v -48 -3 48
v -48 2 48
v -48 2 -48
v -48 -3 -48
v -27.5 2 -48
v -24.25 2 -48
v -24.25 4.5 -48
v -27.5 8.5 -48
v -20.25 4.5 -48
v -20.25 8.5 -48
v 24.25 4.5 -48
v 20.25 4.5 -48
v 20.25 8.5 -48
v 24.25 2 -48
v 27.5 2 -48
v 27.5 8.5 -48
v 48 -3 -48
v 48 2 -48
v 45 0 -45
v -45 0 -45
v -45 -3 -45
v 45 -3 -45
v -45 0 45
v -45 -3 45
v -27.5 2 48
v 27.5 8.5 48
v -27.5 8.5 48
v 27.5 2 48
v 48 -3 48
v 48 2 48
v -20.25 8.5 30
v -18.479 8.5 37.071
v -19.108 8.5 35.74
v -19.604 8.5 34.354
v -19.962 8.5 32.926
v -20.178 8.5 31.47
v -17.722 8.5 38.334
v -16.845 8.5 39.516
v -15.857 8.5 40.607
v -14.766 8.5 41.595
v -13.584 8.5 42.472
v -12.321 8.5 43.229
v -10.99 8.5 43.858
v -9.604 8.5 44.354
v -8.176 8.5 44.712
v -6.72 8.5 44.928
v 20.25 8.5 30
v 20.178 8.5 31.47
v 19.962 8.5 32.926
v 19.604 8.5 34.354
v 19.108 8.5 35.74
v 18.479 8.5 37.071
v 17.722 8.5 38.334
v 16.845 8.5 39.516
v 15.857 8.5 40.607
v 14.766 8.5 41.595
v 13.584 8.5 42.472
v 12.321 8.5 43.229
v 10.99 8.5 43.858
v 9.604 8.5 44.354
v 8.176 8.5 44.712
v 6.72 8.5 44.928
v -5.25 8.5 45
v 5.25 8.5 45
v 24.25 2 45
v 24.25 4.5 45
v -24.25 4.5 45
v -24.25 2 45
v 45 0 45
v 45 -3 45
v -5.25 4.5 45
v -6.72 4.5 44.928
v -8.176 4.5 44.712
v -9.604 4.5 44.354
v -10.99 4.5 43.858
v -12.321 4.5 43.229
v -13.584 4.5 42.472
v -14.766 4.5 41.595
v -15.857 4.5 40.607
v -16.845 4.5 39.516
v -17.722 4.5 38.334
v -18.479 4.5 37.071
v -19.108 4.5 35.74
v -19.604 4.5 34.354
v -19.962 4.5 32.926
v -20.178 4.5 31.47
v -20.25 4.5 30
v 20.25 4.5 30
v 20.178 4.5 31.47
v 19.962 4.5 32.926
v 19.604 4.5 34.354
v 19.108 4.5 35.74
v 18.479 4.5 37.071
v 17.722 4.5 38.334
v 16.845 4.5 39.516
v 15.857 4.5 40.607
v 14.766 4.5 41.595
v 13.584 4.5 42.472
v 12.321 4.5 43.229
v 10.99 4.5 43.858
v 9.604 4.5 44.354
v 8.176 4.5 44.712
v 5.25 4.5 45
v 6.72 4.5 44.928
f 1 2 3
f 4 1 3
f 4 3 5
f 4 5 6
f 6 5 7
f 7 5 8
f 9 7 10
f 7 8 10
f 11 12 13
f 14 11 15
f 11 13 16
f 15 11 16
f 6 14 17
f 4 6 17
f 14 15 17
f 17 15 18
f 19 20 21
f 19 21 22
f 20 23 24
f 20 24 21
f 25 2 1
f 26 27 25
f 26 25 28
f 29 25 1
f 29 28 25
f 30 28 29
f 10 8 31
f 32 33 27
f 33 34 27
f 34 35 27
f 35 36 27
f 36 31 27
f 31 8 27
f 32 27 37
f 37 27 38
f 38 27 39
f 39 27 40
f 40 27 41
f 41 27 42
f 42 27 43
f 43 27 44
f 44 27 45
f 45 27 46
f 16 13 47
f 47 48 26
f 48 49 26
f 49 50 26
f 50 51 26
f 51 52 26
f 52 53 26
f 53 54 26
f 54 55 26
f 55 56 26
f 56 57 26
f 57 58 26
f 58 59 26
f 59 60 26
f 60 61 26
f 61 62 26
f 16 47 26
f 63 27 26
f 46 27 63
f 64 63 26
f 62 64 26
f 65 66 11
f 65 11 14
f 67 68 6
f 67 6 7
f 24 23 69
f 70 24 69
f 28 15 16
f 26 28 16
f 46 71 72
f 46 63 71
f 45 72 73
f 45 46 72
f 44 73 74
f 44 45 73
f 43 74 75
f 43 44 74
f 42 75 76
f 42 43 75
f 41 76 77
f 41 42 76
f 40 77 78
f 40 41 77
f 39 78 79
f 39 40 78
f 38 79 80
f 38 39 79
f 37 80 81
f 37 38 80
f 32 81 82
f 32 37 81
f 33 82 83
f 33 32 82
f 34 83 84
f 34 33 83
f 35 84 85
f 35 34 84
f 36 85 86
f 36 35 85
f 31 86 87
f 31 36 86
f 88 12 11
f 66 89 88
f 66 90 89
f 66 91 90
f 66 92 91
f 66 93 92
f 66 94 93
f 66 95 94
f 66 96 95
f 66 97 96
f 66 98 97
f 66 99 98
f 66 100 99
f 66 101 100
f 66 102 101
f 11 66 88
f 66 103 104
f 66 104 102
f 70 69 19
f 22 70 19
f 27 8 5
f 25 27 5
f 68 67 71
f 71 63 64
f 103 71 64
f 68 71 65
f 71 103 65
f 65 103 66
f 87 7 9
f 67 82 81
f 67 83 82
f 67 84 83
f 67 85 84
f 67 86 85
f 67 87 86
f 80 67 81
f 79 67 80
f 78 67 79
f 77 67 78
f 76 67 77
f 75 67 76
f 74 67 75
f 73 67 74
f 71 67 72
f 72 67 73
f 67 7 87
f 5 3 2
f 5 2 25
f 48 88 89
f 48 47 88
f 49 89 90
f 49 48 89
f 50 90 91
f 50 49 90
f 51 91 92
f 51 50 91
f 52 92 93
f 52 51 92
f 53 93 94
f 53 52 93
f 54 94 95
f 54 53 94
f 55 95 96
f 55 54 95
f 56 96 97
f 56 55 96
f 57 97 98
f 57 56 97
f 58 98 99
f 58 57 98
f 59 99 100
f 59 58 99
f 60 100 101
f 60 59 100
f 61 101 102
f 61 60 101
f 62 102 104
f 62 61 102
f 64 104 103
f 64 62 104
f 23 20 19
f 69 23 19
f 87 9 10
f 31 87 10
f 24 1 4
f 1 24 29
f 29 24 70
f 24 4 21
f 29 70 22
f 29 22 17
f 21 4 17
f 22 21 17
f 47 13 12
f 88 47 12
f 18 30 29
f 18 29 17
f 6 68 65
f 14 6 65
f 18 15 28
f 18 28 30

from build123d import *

# Parameters (mm, degrees)
SKETCH1_W           = 96
SKETCH1_H           = 96
SKETCH1_W_2         = 90
SKETCH1_H_2         = 90
BOSS_EXTRUDE1_DEPTH = 2
SKETCH1_3_W         = 96
SKETCH1_3_H         = 96
SKETCH1_3_W_2       = 90
SKETCH1_3_H_2       = 90
BOSS_EXTRUDE2_DEPTH = 3
BOSS_EXTRUDE3_DEPTH = 96
SKETCH3_3_W         = 40.5
SKETCH3_3_H         = 4
BOSS_EXTRUDE4_DEPTH = 3
FILLET1_R           = 15


with BuildPart() as part:
    # Sketch1 → Boss-Extrude1 (new body)
    # profile 1 of 2: a face of its own
    with BuildSketch(Plane(origin=(0, 0, 0), x_dir=(1, 0, 0), z_dir=(0, 1, 0))):
        Rectangle(SKETCH1_W, SKETCH1_H)
        Rectangle(SKETCH1_W_2, SKETCH1_H_2, mode=Mode.SUBTRACT)
    # profile 2 of 2: a face of its own
    with BuildSketch(Plane(origin=(0, 0, 0), x_dir=(1, 0, 0), z_dir=(0, 1, 0))):
        Rectangle(SKETCH1_W_2, SKETCH1_H_2)
    extrude(amount=BOSS_EXTRUDE1_DEPTH)

    # Sketch1<3> → Boss-Extrude2 (add)
    with BuildSketch(Plane(origin=(0, 0, 0), x_dir=(1, 0, 0), z_dir=(0, 1, 0))):
        Rectangle(SKETCH1_3_W, SKETCH1_3_H)
        Rectangle(SKETCH1_3_W_2, SKETCH1_3_H_2, mode=Mode.SUBTRACT)
    extrude(amount=-BOSS_EXTRUDE2_DEPTH)

    # Sketch3 → Boss-Extrude3 (add)
    with BuildSketch(Plane.XY.offset(48)):
        Polygon((-27.5, 8.5), (-27.5, 2), (-24.25, 2), (-24.25, 4.5), (-20.25, 4.5), (-20.25, 8.5), align=None)
        Polygon((24.25, 4.5), (24.25, 2), (27.5, 2), (27.5, 8.5), (20.25, 8.5), (20.25, 4.5), align=None)
    extrude(amount=-BOSS_EXTRUDE3_DEPTH)

    # Sketch3<3> → Boss-Extrude4 (add)
    with BuildSketch(Plane.XY.offset(48)):
        Polygon((-24.25, 4.5), (-24.25, 2), (24.25, 2), (24.25, 4.5), (20.25, 4.5), (-20.25, 4.5), align=None)
        with Locations((0, 6.5)):
            Rectangle(SKETCH3_3_W, SKETCH3_3_H)
    extrude(amount=-BOSS_EXTRUDE4_DEPTH)

    # Fillet1
    fillet1_edges = [part.edges().sort_by_distance(p)[0] for p in [
        (-20.25, 6.5, 45),
        (20.25, 6.5, 45),
    ]]
    fillet(fillet1_edges, radius=FILLET1_R)


solid = part.part
